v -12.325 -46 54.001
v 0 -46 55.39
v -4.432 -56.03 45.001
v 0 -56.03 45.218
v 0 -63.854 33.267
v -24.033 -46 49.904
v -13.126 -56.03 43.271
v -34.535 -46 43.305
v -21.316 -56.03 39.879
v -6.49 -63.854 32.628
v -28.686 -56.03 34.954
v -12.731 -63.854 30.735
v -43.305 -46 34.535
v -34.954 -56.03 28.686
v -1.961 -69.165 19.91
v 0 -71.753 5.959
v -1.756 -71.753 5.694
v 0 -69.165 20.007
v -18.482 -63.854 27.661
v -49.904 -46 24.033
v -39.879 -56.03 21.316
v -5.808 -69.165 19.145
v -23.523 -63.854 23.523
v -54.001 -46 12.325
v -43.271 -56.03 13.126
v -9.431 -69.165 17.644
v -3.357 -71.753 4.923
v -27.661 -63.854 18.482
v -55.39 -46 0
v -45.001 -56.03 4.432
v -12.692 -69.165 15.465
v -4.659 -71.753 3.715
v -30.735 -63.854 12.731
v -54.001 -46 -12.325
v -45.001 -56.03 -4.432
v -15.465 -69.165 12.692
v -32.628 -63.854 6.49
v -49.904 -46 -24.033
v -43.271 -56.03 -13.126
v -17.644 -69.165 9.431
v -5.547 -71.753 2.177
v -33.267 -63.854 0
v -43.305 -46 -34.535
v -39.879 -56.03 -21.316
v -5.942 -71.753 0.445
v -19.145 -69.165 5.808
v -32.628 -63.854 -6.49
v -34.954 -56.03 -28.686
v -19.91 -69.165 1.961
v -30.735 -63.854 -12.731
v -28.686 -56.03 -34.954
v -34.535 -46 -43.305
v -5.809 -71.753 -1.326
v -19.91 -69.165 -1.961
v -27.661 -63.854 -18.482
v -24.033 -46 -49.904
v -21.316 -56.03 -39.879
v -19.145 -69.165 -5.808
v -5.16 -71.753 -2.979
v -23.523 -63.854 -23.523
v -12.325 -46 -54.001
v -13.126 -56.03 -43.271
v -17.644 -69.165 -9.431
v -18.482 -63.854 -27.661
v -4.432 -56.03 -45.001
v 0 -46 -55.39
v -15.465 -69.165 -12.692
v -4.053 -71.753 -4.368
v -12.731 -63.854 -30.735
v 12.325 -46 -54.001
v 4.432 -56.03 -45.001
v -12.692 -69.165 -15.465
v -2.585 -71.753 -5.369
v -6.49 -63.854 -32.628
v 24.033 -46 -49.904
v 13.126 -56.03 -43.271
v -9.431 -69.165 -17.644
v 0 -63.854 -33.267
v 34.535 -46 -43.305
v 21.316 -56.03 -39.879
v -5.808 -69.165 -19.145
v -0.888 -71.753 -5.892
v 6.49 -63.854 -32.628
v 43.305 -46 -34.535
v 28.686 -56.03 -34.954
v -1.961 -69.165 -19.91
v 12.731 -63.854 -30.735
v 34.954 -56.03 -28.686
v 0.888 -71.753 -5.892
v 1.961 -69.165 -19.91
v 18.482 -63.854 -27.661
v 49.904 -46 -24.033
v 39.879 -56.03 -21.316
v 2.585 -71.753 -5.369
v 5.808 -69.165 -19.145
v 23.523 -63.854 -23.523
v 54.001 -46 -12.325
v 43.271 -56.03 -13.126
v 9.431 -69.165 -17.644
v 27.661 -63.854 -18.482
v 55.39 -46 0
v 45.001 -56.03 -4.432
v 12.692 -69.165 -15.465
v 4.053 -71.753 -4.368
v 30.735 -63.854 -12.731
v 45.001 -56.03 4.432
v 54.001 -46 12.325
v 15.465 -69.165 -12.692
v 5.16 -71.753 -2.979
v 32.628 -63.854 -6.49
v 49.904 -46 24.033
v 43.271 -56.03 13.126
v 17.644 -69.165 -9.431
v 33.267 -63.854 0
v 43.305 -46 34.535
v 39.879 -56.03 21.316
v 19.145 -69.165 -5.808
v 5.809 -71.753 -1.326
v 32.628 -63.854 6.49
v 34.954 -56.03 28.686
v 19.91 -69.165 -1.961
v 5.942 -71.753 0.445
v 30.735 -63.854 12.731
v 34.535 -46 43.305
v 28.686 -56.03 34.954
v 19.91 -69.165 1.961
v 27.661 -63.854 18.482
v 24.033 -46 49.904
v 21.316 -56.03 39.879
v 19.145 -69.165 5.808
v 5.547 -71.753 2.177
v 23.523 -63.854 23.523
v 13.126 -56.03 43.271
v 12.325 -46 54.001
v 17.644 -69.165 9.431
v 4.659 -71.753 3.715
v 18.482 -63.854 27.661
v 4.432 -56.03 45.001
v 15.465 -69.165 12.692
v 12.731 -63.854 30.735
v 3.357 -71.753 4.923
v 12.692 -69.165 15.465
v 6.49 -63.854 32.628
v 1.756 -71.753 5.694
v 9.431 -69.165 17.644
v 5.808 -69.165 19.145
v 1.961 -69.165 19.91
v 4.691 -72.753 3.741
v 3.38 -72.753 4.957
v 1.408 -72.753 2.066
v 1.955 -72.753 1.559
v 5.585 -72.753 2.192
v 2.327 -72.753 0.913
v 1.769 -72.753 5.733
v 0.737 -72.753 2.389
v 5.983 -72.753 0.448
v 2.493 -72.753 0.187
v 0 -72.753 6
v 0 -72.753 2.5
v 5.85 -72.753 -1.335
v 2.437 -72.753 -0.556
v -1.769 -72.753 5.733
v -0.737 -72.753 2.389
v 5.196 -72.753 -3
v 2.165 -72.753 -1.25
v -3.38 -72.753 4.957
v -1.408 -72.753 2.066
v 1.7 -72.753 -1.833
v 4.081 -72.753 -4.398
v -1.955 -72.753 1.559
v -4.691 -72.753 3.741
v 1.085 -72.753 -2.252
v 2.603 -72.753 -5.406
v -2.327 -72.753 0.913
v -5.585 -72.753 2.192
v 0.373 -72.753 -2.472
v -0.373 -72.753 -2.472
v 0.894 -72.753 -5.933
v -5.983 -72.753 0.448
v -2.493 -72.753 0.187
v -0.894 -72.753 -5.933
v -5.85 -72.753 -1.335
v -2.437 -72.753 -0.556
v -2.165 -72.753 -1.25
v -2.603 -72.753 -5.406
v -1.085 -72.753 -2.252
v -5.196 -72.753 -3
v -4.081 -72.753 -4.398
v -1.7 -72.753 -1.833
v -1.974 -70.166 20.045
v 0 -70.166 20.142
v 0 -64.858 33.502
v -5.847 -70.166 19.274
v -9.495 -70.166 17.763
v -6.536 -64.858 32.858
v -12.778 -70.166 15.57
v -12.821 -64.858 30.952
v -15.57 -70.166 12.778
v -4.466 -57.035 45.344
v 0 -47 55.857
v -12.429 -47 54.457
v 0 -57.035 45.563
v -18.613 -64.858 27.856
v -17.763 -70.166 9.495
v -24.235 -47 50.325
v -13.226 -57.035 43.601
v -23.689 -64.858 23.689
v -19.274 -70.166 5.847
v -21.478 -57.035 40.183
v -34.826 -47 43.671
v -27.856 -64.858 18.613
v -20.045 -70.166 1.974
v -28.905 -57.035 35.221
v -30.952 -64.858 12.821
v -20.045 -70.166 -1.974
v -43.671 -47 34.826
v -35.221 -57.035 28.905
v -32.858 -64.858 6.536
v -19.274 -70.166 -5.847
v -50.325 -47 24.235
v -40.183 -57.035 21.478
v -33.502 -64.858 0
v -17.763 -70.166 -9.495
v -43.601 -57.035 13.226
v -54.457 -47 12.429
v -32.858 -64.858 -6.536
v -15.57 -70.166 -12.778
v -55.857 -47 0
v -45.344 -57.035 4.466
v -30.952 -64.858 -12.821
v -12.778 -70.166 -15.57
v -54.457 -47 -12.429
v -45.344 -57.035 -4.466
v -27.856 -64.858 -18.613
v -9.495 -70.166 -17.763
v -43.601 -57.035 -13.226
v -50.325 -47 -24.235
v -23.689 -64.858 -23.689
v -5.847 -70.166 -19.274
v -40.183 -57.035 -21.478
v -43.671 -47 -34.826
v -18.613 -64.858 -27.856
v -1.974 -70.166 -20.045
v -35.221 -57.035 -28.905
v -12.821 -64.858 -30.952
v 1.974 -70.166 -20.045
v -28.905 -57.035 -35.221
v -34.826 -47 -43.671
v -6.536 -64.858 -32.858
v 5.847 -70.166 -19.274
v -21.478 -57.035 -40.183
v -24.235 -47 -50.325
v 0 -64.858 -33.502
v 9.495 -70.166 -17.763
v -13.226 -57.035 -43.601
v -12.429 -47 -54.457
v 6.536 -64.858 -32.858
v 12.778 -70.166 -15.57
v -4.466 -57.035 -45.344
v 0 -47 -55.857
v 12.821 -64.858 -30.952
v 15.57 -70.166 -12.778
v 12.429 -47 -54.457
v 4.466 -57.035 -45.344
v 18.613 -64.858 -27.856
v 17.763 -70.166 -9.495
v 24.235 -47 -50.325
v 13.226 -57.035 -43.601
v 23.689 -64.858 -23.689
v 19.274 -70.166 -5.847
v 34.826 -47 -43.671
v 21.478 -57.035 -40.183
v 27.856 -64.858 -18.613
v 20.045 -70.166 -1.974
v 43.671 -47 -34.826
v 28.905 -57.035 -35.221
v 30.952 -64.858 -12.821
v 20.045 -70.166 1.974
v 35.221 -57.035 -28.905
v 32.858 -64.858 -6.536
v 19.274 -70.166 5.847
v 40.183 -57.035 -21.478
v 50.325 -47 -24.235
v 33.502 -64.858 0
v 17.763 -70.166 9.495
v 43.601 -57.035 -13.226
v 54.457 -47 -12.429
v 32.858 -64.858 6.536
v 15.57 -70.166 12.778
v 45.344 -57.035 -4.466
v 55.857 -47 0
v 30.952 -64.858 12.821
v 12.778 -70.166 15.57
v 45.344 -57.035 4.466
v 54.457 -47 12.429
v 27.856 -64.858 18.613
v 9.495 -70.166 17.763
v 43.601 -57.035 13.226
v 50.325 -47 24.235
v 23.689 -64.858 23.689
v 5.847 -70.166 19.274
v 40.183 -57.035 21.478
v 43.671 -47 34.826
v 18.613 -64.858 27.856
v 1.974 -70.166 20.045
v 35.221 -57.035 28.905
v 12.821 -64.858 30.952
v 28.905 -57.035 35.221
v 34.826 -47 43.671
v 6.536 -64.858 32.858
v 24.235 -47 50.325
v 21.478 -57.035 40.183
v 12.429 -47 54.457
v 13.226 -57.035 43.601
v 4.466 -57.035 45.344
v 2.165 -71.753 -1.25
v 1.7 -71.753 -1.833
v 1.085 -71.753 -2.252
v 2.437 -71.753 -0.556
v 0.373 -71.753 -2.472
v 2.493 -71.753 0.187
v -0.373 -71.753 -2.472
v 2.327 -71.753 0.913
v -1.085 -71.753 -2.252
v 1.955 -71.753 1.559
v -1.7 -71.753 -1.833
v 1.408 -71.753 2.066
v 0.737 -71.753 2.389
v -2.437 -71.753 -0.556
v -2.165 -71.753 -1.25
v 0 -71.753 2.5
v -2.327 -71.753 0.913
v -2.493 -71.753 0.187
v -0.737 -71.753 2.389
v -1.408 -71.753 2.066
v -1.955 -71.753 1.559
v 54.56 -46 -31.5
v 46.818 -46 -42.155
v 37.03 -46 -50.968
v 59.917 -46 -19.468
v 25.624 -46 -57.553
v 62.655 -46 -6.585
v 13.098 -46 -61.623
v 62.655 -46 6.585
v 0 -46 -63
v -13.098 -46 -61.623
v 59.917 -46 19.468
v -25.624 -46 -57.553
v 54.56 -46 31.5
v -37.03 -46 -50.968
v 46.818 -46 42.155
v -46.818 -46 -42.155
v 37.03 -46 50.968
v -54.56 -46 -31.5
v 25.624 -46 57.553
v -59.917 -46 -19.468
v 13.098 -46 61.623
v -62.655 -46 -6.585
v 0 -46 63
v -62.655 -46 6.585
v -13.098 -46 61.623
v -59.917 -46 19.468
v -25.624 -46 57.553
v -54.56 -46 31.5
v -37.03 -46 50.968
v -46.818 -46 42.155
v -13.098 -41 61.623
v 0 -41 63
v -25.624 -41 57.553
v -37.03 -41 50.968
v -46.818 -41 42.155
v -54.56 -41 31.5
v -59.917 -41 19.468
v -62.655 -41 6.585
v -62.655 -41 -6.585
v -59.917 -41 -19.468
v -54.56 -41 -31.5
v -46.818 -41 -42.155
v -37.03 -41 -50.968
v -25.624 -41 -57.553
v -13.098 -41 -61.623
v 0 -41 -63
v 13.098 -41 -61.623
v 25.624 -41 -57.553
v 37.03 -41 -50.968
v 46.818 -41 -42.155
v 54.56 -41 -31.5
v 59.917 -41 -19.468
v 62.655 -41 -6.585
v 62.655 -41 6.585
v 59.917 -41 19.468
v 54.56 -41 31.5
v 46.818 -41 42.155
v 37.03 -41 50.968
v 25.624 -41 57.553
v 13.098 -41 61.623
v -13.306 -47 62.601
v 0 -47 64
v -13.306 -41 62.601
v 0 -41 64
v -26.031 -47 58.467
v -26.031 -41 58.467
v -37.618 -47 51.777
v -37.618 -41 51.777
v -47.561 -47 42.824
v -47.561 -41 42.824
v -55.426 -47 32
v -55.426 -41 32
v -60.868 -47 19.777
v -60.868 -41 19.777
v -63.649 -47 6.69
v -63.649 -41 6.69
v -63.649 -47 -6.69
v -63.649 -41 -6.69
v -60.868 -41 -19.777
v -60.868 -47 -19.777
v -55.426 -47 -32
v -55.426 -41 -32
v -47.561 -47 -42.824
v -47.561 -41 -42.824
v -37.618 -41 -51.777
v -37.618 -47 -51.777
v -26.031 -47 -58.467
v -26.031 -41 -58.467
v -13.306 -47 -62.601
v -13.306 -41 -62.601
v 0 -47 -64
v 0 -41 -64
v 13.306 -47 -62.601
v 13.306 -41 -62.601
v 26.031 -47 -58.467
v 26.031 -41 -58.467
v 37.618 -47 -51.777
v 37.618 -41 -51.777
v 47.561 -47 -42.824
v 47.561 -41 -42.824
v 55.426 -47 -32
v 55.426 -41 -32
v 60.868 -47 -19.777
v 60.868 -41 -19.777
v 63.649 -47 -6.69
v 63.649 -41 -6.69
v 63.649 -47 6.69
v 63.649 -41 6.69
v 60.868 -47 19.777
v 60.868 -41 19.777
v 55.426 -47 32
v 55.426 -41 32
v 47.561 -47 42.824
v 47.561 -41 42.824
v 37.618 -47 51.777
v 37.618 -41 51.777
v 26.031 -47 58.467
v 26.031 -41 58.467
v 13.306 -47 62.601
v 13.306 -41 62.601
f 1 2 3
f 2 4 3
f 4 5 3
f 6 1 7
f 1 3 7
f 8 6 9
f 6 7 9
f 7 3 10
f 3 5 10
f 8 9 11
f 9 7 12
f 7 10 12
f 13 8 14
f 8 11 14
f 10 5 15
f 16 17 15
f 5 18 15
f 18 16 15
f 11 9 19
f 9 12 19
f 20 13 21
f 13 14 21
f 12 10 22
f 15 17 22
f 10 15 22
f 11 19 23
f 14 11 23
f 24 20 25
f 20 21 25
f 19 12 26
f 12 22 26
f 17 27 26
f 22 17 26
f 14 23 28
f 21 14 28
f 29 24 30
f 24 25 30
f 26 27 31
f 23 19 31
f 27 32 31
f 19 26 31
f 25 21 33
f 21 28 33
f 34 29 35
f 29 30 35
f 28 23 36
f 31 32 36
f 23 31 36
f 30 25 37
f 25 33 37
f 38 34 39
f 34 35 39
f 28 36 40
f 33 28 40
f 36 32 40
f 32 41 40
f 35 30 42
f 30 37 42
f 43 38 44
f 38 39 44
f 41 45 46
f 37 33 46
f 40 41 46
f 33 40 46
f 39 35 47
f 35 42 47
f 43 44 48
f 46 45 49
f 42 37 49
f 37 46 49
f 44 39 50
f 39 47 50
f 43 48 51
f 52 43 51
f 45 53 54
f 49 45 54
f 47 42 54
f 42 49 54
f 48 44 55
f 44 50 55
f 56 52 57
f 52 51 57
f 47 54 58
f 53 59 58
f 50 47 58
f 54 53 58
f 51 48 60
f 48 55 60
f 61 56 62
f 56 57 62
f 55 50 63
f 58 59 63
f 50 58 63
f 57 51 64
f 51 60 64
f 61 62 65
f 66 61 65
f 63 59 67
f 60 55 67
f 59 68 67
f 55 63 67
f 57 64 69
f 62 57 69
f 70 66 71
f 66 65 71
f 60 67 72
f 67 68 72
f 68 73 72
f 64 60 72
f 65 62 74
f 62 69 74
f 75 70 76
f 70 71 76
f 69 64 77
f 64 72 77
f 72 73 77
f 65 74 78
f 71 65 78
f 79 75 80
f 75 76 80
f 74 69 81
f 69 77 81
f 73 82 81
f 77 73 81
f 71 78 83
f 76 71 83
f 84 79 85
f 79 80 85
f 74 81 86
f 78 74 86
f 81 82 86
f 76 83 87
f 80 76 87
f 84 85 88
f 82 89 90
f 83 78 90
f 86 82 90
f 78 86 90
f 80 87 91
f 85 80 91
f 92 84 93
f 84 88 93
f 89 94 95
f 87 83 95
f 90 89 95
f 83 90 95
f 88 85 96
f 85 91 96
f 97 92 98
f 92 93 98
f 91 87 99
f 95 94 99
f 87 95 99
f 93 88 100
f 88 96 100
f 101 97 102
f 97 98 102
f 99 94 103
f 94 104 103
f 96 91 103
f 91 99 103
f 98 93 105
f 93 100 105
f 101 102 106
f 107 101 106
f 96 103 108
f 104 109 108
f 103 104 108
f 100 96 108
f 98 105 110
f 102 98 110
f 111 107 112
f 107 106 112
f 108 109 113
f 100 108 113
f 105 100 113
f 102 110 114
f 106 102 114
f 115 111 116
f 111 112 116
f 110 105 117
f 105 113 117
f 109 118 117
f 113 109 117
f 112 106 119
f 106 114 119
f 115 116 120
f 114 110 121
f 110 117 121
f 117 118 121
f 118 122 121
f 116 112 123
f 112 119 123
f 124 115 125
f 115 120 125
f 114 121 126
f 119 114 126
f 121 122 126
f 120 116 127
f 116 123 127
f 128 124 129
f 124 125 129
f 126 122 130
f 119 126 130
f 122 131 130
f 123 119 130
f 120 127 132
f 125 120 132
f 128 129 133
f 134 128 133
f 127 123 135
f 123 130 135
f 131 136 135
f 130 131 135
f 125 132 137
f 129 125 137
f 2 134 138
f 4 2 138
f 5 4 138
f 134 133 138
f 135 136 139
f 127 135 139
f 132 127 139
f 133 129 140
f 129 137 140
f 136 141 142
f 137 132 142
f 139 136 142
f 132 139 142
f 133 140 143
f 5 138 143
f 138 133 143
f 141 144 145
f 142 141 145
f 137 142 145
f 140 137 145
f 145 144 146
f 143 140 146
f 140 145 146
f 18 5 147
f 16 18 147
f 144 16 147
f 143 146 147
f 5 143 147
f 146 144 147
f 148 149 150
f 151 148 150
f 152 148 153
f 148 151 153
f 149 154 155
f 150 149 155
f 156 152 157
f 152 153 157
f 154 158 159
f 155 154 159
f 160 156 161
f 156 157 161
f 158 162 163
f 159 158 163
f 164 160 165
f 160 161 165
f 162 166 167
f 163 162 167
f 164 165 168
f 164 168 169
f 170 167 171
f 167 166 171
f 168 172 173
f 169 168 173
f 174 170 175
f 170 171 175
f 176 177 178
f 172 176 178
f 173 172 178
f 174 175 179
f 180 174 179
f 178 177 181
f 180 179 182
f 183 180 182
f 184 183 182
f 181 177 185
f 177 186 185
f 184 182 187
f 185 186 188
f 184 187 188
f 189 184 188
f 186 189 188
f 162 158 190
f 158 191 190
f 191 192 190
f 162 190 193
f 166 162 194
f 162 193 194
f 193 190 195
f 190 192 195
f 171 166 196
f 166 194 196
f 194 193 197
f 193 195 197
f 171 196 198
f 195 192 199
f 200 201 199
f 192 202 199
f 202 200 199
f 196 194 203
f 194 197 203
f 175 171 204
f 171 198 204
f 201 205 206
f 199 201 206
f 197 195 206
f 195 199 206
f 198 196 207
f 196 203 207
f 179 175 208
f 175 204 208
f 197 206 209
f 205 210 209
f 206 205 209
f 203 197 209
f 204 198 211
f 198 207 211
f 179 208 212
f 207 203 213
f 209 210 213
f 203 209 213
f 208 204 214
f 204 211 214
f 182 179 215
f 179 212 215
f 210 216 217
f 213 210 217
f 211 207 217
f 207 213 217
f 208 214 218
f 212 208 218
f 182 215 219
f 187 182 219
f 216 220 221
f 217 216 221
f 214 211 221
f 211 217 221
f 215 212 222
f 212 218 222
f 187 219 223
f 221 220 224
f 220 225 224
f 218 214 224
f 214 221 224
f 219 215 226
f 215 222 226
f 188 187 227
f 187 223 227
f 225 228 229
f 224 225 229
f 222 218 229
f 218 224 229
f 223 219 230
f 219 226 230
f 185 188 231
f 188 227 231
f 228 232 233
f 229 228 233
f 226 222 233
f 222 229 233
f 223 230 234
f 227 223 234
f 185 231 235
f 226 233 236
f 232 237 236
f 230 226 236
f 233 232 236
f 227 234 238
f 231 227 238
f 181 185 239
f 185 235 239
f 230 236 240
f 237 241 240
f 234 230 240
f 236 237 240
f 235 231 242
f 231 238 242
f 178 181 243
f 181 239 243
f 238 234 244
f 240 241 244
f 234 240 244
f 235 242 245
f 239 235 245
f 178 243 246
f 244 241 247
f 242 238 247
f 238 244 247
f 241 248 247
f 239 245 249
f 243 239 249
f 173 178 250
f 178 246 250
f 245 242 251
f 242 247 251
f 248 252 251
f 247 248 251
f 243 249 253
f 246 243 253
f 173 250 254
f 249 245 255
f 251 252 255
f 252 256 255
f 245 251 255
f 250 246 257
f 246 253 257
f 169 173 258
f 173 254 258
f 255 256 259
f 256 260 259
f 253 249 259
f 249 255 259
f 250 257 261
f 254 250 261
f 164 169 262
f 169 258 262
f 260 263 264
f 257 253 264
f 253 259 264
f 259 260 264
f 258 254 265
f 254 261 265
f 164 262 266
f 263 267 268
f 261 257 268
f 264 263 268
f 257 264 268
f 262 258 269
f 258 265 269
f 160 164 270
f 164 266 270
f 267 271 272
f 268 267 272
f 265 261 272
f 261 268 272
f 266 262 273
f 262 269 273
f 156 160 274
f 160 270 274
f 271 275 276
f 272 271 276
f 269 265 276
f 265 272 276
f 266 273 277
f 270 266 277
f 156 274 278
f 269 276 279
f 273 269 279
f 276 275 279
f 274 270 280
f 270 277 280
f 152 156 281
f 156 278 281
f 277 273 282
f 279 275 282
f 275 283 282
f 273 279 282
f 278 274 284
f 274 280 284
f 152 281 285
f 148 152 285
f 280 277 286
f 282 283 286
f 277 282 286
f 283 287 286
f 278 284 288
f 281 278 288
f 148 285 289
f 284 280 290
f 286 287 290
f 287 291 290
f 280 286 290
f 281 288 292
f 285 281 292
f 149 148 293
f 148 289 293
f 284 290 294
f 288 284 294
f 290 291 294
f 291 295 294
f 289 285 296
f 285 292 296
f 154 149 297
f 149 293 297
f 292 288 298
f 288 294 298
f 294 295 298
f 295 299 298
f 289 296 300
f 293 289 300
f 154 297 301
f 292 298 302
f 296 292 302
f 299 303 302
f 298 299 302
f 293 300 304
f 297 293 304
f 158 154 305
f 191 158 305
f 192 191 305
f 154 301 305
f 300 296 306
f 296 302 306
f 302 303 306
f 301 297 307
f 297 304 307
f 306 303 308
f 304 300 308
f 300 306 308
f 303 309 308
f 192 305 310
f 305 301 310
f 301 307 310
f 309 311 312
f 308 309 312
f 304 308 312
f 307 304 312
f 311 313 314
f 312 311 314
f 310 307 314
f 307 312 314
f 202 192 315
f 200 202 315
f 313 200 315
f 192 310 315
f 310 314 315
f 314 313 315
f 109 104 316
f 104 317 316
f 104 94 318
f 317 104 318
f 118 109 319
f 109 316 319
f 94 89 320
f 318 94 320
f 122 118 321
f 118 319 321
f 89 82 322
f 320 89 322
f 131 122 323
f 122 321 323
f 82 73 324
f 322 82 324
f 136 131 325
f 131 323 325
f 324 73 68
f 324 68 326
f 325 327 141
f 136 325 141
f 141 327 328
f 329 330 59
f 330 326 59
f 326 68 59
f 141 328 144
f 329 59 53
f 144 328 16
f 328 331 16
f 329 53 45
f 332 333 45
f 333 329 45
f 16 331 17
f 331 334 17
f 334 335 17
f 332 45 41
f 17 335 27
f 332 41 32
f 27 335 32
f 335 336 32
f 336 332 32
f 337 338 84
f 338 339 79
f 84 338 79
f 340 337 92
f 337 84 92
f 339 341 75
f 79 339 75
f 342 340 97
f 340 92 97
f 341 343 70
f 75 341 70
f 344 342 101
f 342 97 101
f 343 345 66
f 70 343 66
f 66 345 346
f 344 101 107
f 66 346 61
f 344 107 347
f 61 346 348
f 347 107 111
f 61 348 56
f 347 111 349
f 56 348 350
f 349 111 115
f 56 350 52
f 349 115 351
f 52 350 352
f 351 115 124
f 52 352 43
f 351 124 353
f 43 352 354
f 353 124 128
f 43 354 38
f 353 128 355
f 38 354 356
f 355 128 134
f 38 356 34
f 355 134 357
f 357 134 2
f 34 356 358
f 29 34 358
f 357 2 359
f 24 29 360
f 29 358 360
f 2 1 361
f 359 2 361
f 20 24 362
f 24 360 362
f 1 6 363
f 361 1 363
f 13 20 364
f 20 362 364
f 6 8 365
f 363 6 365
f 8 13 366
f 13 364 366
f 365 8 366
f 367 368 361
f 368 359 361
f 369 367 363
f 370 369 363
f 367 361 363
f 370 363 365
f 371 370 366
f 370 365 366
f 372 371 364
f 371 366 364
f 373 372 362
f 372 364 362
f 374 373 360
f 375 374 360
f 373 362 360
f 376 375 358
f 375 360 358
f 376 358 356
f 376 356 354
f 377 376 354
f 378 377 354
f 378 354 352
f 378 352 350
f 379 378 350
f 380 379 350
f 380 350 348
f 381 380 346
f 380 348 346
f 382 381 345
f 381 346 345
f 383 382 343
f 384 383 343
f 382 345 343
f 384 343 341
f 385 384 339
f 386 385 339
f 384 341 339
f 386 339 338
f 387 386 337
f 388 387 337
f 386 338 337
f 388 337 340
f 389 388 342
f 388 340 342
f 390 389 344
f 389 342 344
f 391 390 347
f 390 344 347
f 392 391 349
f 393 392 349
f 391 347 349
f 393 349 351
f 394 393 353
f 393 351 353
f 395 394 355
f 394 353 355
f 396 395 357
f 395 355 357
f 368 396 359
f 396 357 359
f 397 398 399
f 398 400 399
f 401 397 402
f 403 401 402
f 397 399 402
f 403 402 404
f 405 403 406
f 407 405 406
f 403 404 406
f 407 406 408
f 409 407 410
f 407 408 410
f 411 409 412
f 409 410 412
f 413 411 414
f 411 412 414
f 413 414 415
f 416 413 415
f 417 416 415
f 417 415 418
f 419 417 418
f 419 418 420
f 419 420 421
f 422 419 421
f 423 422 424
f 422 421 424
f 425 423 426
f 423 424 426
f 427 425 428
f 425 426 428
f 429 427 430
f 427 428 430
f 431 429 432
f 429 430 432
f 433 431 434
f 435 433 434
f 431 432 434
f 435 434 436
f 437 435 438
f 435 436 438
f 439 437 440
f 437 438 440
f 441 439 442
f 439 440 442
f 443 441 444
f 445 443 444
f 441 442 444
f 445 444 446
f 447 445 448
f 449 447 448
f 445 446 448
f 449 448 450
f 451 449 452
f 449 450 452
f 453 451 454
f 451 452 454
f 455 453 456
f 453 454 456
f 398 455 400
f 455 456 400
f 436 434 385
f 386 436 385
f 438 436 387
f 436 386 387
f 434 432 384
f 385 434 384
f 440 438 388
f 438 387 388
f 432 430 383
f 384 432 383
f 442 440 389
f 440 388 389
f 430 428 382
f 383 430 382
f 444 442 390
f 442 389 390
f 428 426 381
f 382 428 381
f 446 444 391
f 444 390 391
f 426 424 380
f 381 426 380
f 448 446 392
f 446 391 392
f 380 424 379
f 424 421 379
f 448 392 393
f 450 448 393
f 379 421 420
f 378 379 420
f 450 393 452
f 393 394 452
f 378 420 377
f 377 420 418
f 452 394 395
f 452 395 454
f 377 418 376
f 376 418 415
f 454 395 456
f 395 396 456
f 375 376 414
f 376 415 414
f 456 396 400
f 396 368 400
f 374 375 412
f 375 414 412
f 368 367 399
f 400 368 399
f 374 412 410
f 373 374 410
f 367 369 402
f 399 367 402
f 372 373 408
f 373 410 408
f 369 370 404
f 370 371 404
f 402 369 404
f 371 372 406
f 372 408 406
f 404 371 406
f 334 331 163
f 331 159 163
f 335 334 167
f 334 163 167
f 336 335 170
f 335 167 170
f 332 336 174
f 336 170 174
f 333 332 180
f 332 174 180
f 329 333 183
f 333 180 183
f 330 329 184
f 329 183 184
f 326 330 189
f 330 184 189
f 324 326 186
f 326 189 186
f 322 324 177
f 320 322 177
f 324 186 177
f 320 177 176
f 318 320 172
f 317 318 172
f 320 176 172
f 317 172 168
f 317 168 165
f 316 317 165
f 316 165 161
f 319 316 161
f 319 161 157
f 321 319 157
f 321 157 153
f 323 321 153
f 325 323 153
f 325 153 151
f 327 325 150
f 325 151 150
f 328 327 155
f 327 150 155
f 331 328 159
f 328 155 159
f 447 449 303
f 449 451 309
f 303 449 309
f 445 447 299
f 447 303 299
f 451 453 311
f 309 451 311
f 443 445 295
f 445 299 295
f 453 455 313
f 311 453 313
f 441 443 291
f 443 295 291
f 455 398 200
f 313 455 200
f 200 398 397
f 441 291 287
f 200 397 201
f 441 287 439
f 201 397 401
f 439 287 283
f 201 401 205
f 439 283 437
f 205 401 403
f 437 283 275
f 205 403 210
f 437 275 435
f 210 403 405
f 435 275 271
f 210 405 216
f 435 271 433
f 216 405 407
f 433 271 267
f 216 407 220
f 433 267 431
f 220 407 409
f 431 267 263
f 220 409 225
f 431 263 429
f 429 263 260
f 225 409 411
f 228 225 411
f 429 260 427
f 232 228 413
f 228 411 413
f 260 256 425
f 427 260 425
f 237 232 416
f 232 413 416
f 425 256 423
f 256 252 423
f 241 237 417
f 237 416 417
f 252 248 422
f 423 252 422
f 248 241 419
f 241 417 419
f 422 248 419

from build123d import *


with BuildPart() as part:
    # Sketch1 → Revolve2 (revolve)
    with BuildSketch(Plane.XY, mode=Mode.PRIVATE) as revolve2_sk:
        with BuildLine():
            Line((-2.5, -72.753006811), (-6, -72.753006811))
            ThreePointArc((-6, -72.753006811), (-33.50186891, -64.858498129), (-55.856960175, -47))
            Line((-55.856960175, -47), (-64, -47))
            Line((-64, -47), (-64, -41))
            Line((-64, -41), (-63, -41))
            Line((-63, -41), (-63, -46))
            Line((-63, -46), (-55.389529697, -46))
            ThreePointArc((-55.389529697, -46), (-33.267182398, -63.853696646), (-5.958692274, -71.753006811))
            Line((-5.958692274, -71.753006811), (-2.5, -71.753006811))
            Line((-2.5, -71.753006811), (-2.5, -72.753006811))
        make_face()
    revolve(revolve2_sk.sketch.rotate(Axis((0, 36.298912202, 0), (0, -1, 0)), 270), axis=Axis((0, 36.298912202, 0), (0, -1, 0)))


solid = part.part
